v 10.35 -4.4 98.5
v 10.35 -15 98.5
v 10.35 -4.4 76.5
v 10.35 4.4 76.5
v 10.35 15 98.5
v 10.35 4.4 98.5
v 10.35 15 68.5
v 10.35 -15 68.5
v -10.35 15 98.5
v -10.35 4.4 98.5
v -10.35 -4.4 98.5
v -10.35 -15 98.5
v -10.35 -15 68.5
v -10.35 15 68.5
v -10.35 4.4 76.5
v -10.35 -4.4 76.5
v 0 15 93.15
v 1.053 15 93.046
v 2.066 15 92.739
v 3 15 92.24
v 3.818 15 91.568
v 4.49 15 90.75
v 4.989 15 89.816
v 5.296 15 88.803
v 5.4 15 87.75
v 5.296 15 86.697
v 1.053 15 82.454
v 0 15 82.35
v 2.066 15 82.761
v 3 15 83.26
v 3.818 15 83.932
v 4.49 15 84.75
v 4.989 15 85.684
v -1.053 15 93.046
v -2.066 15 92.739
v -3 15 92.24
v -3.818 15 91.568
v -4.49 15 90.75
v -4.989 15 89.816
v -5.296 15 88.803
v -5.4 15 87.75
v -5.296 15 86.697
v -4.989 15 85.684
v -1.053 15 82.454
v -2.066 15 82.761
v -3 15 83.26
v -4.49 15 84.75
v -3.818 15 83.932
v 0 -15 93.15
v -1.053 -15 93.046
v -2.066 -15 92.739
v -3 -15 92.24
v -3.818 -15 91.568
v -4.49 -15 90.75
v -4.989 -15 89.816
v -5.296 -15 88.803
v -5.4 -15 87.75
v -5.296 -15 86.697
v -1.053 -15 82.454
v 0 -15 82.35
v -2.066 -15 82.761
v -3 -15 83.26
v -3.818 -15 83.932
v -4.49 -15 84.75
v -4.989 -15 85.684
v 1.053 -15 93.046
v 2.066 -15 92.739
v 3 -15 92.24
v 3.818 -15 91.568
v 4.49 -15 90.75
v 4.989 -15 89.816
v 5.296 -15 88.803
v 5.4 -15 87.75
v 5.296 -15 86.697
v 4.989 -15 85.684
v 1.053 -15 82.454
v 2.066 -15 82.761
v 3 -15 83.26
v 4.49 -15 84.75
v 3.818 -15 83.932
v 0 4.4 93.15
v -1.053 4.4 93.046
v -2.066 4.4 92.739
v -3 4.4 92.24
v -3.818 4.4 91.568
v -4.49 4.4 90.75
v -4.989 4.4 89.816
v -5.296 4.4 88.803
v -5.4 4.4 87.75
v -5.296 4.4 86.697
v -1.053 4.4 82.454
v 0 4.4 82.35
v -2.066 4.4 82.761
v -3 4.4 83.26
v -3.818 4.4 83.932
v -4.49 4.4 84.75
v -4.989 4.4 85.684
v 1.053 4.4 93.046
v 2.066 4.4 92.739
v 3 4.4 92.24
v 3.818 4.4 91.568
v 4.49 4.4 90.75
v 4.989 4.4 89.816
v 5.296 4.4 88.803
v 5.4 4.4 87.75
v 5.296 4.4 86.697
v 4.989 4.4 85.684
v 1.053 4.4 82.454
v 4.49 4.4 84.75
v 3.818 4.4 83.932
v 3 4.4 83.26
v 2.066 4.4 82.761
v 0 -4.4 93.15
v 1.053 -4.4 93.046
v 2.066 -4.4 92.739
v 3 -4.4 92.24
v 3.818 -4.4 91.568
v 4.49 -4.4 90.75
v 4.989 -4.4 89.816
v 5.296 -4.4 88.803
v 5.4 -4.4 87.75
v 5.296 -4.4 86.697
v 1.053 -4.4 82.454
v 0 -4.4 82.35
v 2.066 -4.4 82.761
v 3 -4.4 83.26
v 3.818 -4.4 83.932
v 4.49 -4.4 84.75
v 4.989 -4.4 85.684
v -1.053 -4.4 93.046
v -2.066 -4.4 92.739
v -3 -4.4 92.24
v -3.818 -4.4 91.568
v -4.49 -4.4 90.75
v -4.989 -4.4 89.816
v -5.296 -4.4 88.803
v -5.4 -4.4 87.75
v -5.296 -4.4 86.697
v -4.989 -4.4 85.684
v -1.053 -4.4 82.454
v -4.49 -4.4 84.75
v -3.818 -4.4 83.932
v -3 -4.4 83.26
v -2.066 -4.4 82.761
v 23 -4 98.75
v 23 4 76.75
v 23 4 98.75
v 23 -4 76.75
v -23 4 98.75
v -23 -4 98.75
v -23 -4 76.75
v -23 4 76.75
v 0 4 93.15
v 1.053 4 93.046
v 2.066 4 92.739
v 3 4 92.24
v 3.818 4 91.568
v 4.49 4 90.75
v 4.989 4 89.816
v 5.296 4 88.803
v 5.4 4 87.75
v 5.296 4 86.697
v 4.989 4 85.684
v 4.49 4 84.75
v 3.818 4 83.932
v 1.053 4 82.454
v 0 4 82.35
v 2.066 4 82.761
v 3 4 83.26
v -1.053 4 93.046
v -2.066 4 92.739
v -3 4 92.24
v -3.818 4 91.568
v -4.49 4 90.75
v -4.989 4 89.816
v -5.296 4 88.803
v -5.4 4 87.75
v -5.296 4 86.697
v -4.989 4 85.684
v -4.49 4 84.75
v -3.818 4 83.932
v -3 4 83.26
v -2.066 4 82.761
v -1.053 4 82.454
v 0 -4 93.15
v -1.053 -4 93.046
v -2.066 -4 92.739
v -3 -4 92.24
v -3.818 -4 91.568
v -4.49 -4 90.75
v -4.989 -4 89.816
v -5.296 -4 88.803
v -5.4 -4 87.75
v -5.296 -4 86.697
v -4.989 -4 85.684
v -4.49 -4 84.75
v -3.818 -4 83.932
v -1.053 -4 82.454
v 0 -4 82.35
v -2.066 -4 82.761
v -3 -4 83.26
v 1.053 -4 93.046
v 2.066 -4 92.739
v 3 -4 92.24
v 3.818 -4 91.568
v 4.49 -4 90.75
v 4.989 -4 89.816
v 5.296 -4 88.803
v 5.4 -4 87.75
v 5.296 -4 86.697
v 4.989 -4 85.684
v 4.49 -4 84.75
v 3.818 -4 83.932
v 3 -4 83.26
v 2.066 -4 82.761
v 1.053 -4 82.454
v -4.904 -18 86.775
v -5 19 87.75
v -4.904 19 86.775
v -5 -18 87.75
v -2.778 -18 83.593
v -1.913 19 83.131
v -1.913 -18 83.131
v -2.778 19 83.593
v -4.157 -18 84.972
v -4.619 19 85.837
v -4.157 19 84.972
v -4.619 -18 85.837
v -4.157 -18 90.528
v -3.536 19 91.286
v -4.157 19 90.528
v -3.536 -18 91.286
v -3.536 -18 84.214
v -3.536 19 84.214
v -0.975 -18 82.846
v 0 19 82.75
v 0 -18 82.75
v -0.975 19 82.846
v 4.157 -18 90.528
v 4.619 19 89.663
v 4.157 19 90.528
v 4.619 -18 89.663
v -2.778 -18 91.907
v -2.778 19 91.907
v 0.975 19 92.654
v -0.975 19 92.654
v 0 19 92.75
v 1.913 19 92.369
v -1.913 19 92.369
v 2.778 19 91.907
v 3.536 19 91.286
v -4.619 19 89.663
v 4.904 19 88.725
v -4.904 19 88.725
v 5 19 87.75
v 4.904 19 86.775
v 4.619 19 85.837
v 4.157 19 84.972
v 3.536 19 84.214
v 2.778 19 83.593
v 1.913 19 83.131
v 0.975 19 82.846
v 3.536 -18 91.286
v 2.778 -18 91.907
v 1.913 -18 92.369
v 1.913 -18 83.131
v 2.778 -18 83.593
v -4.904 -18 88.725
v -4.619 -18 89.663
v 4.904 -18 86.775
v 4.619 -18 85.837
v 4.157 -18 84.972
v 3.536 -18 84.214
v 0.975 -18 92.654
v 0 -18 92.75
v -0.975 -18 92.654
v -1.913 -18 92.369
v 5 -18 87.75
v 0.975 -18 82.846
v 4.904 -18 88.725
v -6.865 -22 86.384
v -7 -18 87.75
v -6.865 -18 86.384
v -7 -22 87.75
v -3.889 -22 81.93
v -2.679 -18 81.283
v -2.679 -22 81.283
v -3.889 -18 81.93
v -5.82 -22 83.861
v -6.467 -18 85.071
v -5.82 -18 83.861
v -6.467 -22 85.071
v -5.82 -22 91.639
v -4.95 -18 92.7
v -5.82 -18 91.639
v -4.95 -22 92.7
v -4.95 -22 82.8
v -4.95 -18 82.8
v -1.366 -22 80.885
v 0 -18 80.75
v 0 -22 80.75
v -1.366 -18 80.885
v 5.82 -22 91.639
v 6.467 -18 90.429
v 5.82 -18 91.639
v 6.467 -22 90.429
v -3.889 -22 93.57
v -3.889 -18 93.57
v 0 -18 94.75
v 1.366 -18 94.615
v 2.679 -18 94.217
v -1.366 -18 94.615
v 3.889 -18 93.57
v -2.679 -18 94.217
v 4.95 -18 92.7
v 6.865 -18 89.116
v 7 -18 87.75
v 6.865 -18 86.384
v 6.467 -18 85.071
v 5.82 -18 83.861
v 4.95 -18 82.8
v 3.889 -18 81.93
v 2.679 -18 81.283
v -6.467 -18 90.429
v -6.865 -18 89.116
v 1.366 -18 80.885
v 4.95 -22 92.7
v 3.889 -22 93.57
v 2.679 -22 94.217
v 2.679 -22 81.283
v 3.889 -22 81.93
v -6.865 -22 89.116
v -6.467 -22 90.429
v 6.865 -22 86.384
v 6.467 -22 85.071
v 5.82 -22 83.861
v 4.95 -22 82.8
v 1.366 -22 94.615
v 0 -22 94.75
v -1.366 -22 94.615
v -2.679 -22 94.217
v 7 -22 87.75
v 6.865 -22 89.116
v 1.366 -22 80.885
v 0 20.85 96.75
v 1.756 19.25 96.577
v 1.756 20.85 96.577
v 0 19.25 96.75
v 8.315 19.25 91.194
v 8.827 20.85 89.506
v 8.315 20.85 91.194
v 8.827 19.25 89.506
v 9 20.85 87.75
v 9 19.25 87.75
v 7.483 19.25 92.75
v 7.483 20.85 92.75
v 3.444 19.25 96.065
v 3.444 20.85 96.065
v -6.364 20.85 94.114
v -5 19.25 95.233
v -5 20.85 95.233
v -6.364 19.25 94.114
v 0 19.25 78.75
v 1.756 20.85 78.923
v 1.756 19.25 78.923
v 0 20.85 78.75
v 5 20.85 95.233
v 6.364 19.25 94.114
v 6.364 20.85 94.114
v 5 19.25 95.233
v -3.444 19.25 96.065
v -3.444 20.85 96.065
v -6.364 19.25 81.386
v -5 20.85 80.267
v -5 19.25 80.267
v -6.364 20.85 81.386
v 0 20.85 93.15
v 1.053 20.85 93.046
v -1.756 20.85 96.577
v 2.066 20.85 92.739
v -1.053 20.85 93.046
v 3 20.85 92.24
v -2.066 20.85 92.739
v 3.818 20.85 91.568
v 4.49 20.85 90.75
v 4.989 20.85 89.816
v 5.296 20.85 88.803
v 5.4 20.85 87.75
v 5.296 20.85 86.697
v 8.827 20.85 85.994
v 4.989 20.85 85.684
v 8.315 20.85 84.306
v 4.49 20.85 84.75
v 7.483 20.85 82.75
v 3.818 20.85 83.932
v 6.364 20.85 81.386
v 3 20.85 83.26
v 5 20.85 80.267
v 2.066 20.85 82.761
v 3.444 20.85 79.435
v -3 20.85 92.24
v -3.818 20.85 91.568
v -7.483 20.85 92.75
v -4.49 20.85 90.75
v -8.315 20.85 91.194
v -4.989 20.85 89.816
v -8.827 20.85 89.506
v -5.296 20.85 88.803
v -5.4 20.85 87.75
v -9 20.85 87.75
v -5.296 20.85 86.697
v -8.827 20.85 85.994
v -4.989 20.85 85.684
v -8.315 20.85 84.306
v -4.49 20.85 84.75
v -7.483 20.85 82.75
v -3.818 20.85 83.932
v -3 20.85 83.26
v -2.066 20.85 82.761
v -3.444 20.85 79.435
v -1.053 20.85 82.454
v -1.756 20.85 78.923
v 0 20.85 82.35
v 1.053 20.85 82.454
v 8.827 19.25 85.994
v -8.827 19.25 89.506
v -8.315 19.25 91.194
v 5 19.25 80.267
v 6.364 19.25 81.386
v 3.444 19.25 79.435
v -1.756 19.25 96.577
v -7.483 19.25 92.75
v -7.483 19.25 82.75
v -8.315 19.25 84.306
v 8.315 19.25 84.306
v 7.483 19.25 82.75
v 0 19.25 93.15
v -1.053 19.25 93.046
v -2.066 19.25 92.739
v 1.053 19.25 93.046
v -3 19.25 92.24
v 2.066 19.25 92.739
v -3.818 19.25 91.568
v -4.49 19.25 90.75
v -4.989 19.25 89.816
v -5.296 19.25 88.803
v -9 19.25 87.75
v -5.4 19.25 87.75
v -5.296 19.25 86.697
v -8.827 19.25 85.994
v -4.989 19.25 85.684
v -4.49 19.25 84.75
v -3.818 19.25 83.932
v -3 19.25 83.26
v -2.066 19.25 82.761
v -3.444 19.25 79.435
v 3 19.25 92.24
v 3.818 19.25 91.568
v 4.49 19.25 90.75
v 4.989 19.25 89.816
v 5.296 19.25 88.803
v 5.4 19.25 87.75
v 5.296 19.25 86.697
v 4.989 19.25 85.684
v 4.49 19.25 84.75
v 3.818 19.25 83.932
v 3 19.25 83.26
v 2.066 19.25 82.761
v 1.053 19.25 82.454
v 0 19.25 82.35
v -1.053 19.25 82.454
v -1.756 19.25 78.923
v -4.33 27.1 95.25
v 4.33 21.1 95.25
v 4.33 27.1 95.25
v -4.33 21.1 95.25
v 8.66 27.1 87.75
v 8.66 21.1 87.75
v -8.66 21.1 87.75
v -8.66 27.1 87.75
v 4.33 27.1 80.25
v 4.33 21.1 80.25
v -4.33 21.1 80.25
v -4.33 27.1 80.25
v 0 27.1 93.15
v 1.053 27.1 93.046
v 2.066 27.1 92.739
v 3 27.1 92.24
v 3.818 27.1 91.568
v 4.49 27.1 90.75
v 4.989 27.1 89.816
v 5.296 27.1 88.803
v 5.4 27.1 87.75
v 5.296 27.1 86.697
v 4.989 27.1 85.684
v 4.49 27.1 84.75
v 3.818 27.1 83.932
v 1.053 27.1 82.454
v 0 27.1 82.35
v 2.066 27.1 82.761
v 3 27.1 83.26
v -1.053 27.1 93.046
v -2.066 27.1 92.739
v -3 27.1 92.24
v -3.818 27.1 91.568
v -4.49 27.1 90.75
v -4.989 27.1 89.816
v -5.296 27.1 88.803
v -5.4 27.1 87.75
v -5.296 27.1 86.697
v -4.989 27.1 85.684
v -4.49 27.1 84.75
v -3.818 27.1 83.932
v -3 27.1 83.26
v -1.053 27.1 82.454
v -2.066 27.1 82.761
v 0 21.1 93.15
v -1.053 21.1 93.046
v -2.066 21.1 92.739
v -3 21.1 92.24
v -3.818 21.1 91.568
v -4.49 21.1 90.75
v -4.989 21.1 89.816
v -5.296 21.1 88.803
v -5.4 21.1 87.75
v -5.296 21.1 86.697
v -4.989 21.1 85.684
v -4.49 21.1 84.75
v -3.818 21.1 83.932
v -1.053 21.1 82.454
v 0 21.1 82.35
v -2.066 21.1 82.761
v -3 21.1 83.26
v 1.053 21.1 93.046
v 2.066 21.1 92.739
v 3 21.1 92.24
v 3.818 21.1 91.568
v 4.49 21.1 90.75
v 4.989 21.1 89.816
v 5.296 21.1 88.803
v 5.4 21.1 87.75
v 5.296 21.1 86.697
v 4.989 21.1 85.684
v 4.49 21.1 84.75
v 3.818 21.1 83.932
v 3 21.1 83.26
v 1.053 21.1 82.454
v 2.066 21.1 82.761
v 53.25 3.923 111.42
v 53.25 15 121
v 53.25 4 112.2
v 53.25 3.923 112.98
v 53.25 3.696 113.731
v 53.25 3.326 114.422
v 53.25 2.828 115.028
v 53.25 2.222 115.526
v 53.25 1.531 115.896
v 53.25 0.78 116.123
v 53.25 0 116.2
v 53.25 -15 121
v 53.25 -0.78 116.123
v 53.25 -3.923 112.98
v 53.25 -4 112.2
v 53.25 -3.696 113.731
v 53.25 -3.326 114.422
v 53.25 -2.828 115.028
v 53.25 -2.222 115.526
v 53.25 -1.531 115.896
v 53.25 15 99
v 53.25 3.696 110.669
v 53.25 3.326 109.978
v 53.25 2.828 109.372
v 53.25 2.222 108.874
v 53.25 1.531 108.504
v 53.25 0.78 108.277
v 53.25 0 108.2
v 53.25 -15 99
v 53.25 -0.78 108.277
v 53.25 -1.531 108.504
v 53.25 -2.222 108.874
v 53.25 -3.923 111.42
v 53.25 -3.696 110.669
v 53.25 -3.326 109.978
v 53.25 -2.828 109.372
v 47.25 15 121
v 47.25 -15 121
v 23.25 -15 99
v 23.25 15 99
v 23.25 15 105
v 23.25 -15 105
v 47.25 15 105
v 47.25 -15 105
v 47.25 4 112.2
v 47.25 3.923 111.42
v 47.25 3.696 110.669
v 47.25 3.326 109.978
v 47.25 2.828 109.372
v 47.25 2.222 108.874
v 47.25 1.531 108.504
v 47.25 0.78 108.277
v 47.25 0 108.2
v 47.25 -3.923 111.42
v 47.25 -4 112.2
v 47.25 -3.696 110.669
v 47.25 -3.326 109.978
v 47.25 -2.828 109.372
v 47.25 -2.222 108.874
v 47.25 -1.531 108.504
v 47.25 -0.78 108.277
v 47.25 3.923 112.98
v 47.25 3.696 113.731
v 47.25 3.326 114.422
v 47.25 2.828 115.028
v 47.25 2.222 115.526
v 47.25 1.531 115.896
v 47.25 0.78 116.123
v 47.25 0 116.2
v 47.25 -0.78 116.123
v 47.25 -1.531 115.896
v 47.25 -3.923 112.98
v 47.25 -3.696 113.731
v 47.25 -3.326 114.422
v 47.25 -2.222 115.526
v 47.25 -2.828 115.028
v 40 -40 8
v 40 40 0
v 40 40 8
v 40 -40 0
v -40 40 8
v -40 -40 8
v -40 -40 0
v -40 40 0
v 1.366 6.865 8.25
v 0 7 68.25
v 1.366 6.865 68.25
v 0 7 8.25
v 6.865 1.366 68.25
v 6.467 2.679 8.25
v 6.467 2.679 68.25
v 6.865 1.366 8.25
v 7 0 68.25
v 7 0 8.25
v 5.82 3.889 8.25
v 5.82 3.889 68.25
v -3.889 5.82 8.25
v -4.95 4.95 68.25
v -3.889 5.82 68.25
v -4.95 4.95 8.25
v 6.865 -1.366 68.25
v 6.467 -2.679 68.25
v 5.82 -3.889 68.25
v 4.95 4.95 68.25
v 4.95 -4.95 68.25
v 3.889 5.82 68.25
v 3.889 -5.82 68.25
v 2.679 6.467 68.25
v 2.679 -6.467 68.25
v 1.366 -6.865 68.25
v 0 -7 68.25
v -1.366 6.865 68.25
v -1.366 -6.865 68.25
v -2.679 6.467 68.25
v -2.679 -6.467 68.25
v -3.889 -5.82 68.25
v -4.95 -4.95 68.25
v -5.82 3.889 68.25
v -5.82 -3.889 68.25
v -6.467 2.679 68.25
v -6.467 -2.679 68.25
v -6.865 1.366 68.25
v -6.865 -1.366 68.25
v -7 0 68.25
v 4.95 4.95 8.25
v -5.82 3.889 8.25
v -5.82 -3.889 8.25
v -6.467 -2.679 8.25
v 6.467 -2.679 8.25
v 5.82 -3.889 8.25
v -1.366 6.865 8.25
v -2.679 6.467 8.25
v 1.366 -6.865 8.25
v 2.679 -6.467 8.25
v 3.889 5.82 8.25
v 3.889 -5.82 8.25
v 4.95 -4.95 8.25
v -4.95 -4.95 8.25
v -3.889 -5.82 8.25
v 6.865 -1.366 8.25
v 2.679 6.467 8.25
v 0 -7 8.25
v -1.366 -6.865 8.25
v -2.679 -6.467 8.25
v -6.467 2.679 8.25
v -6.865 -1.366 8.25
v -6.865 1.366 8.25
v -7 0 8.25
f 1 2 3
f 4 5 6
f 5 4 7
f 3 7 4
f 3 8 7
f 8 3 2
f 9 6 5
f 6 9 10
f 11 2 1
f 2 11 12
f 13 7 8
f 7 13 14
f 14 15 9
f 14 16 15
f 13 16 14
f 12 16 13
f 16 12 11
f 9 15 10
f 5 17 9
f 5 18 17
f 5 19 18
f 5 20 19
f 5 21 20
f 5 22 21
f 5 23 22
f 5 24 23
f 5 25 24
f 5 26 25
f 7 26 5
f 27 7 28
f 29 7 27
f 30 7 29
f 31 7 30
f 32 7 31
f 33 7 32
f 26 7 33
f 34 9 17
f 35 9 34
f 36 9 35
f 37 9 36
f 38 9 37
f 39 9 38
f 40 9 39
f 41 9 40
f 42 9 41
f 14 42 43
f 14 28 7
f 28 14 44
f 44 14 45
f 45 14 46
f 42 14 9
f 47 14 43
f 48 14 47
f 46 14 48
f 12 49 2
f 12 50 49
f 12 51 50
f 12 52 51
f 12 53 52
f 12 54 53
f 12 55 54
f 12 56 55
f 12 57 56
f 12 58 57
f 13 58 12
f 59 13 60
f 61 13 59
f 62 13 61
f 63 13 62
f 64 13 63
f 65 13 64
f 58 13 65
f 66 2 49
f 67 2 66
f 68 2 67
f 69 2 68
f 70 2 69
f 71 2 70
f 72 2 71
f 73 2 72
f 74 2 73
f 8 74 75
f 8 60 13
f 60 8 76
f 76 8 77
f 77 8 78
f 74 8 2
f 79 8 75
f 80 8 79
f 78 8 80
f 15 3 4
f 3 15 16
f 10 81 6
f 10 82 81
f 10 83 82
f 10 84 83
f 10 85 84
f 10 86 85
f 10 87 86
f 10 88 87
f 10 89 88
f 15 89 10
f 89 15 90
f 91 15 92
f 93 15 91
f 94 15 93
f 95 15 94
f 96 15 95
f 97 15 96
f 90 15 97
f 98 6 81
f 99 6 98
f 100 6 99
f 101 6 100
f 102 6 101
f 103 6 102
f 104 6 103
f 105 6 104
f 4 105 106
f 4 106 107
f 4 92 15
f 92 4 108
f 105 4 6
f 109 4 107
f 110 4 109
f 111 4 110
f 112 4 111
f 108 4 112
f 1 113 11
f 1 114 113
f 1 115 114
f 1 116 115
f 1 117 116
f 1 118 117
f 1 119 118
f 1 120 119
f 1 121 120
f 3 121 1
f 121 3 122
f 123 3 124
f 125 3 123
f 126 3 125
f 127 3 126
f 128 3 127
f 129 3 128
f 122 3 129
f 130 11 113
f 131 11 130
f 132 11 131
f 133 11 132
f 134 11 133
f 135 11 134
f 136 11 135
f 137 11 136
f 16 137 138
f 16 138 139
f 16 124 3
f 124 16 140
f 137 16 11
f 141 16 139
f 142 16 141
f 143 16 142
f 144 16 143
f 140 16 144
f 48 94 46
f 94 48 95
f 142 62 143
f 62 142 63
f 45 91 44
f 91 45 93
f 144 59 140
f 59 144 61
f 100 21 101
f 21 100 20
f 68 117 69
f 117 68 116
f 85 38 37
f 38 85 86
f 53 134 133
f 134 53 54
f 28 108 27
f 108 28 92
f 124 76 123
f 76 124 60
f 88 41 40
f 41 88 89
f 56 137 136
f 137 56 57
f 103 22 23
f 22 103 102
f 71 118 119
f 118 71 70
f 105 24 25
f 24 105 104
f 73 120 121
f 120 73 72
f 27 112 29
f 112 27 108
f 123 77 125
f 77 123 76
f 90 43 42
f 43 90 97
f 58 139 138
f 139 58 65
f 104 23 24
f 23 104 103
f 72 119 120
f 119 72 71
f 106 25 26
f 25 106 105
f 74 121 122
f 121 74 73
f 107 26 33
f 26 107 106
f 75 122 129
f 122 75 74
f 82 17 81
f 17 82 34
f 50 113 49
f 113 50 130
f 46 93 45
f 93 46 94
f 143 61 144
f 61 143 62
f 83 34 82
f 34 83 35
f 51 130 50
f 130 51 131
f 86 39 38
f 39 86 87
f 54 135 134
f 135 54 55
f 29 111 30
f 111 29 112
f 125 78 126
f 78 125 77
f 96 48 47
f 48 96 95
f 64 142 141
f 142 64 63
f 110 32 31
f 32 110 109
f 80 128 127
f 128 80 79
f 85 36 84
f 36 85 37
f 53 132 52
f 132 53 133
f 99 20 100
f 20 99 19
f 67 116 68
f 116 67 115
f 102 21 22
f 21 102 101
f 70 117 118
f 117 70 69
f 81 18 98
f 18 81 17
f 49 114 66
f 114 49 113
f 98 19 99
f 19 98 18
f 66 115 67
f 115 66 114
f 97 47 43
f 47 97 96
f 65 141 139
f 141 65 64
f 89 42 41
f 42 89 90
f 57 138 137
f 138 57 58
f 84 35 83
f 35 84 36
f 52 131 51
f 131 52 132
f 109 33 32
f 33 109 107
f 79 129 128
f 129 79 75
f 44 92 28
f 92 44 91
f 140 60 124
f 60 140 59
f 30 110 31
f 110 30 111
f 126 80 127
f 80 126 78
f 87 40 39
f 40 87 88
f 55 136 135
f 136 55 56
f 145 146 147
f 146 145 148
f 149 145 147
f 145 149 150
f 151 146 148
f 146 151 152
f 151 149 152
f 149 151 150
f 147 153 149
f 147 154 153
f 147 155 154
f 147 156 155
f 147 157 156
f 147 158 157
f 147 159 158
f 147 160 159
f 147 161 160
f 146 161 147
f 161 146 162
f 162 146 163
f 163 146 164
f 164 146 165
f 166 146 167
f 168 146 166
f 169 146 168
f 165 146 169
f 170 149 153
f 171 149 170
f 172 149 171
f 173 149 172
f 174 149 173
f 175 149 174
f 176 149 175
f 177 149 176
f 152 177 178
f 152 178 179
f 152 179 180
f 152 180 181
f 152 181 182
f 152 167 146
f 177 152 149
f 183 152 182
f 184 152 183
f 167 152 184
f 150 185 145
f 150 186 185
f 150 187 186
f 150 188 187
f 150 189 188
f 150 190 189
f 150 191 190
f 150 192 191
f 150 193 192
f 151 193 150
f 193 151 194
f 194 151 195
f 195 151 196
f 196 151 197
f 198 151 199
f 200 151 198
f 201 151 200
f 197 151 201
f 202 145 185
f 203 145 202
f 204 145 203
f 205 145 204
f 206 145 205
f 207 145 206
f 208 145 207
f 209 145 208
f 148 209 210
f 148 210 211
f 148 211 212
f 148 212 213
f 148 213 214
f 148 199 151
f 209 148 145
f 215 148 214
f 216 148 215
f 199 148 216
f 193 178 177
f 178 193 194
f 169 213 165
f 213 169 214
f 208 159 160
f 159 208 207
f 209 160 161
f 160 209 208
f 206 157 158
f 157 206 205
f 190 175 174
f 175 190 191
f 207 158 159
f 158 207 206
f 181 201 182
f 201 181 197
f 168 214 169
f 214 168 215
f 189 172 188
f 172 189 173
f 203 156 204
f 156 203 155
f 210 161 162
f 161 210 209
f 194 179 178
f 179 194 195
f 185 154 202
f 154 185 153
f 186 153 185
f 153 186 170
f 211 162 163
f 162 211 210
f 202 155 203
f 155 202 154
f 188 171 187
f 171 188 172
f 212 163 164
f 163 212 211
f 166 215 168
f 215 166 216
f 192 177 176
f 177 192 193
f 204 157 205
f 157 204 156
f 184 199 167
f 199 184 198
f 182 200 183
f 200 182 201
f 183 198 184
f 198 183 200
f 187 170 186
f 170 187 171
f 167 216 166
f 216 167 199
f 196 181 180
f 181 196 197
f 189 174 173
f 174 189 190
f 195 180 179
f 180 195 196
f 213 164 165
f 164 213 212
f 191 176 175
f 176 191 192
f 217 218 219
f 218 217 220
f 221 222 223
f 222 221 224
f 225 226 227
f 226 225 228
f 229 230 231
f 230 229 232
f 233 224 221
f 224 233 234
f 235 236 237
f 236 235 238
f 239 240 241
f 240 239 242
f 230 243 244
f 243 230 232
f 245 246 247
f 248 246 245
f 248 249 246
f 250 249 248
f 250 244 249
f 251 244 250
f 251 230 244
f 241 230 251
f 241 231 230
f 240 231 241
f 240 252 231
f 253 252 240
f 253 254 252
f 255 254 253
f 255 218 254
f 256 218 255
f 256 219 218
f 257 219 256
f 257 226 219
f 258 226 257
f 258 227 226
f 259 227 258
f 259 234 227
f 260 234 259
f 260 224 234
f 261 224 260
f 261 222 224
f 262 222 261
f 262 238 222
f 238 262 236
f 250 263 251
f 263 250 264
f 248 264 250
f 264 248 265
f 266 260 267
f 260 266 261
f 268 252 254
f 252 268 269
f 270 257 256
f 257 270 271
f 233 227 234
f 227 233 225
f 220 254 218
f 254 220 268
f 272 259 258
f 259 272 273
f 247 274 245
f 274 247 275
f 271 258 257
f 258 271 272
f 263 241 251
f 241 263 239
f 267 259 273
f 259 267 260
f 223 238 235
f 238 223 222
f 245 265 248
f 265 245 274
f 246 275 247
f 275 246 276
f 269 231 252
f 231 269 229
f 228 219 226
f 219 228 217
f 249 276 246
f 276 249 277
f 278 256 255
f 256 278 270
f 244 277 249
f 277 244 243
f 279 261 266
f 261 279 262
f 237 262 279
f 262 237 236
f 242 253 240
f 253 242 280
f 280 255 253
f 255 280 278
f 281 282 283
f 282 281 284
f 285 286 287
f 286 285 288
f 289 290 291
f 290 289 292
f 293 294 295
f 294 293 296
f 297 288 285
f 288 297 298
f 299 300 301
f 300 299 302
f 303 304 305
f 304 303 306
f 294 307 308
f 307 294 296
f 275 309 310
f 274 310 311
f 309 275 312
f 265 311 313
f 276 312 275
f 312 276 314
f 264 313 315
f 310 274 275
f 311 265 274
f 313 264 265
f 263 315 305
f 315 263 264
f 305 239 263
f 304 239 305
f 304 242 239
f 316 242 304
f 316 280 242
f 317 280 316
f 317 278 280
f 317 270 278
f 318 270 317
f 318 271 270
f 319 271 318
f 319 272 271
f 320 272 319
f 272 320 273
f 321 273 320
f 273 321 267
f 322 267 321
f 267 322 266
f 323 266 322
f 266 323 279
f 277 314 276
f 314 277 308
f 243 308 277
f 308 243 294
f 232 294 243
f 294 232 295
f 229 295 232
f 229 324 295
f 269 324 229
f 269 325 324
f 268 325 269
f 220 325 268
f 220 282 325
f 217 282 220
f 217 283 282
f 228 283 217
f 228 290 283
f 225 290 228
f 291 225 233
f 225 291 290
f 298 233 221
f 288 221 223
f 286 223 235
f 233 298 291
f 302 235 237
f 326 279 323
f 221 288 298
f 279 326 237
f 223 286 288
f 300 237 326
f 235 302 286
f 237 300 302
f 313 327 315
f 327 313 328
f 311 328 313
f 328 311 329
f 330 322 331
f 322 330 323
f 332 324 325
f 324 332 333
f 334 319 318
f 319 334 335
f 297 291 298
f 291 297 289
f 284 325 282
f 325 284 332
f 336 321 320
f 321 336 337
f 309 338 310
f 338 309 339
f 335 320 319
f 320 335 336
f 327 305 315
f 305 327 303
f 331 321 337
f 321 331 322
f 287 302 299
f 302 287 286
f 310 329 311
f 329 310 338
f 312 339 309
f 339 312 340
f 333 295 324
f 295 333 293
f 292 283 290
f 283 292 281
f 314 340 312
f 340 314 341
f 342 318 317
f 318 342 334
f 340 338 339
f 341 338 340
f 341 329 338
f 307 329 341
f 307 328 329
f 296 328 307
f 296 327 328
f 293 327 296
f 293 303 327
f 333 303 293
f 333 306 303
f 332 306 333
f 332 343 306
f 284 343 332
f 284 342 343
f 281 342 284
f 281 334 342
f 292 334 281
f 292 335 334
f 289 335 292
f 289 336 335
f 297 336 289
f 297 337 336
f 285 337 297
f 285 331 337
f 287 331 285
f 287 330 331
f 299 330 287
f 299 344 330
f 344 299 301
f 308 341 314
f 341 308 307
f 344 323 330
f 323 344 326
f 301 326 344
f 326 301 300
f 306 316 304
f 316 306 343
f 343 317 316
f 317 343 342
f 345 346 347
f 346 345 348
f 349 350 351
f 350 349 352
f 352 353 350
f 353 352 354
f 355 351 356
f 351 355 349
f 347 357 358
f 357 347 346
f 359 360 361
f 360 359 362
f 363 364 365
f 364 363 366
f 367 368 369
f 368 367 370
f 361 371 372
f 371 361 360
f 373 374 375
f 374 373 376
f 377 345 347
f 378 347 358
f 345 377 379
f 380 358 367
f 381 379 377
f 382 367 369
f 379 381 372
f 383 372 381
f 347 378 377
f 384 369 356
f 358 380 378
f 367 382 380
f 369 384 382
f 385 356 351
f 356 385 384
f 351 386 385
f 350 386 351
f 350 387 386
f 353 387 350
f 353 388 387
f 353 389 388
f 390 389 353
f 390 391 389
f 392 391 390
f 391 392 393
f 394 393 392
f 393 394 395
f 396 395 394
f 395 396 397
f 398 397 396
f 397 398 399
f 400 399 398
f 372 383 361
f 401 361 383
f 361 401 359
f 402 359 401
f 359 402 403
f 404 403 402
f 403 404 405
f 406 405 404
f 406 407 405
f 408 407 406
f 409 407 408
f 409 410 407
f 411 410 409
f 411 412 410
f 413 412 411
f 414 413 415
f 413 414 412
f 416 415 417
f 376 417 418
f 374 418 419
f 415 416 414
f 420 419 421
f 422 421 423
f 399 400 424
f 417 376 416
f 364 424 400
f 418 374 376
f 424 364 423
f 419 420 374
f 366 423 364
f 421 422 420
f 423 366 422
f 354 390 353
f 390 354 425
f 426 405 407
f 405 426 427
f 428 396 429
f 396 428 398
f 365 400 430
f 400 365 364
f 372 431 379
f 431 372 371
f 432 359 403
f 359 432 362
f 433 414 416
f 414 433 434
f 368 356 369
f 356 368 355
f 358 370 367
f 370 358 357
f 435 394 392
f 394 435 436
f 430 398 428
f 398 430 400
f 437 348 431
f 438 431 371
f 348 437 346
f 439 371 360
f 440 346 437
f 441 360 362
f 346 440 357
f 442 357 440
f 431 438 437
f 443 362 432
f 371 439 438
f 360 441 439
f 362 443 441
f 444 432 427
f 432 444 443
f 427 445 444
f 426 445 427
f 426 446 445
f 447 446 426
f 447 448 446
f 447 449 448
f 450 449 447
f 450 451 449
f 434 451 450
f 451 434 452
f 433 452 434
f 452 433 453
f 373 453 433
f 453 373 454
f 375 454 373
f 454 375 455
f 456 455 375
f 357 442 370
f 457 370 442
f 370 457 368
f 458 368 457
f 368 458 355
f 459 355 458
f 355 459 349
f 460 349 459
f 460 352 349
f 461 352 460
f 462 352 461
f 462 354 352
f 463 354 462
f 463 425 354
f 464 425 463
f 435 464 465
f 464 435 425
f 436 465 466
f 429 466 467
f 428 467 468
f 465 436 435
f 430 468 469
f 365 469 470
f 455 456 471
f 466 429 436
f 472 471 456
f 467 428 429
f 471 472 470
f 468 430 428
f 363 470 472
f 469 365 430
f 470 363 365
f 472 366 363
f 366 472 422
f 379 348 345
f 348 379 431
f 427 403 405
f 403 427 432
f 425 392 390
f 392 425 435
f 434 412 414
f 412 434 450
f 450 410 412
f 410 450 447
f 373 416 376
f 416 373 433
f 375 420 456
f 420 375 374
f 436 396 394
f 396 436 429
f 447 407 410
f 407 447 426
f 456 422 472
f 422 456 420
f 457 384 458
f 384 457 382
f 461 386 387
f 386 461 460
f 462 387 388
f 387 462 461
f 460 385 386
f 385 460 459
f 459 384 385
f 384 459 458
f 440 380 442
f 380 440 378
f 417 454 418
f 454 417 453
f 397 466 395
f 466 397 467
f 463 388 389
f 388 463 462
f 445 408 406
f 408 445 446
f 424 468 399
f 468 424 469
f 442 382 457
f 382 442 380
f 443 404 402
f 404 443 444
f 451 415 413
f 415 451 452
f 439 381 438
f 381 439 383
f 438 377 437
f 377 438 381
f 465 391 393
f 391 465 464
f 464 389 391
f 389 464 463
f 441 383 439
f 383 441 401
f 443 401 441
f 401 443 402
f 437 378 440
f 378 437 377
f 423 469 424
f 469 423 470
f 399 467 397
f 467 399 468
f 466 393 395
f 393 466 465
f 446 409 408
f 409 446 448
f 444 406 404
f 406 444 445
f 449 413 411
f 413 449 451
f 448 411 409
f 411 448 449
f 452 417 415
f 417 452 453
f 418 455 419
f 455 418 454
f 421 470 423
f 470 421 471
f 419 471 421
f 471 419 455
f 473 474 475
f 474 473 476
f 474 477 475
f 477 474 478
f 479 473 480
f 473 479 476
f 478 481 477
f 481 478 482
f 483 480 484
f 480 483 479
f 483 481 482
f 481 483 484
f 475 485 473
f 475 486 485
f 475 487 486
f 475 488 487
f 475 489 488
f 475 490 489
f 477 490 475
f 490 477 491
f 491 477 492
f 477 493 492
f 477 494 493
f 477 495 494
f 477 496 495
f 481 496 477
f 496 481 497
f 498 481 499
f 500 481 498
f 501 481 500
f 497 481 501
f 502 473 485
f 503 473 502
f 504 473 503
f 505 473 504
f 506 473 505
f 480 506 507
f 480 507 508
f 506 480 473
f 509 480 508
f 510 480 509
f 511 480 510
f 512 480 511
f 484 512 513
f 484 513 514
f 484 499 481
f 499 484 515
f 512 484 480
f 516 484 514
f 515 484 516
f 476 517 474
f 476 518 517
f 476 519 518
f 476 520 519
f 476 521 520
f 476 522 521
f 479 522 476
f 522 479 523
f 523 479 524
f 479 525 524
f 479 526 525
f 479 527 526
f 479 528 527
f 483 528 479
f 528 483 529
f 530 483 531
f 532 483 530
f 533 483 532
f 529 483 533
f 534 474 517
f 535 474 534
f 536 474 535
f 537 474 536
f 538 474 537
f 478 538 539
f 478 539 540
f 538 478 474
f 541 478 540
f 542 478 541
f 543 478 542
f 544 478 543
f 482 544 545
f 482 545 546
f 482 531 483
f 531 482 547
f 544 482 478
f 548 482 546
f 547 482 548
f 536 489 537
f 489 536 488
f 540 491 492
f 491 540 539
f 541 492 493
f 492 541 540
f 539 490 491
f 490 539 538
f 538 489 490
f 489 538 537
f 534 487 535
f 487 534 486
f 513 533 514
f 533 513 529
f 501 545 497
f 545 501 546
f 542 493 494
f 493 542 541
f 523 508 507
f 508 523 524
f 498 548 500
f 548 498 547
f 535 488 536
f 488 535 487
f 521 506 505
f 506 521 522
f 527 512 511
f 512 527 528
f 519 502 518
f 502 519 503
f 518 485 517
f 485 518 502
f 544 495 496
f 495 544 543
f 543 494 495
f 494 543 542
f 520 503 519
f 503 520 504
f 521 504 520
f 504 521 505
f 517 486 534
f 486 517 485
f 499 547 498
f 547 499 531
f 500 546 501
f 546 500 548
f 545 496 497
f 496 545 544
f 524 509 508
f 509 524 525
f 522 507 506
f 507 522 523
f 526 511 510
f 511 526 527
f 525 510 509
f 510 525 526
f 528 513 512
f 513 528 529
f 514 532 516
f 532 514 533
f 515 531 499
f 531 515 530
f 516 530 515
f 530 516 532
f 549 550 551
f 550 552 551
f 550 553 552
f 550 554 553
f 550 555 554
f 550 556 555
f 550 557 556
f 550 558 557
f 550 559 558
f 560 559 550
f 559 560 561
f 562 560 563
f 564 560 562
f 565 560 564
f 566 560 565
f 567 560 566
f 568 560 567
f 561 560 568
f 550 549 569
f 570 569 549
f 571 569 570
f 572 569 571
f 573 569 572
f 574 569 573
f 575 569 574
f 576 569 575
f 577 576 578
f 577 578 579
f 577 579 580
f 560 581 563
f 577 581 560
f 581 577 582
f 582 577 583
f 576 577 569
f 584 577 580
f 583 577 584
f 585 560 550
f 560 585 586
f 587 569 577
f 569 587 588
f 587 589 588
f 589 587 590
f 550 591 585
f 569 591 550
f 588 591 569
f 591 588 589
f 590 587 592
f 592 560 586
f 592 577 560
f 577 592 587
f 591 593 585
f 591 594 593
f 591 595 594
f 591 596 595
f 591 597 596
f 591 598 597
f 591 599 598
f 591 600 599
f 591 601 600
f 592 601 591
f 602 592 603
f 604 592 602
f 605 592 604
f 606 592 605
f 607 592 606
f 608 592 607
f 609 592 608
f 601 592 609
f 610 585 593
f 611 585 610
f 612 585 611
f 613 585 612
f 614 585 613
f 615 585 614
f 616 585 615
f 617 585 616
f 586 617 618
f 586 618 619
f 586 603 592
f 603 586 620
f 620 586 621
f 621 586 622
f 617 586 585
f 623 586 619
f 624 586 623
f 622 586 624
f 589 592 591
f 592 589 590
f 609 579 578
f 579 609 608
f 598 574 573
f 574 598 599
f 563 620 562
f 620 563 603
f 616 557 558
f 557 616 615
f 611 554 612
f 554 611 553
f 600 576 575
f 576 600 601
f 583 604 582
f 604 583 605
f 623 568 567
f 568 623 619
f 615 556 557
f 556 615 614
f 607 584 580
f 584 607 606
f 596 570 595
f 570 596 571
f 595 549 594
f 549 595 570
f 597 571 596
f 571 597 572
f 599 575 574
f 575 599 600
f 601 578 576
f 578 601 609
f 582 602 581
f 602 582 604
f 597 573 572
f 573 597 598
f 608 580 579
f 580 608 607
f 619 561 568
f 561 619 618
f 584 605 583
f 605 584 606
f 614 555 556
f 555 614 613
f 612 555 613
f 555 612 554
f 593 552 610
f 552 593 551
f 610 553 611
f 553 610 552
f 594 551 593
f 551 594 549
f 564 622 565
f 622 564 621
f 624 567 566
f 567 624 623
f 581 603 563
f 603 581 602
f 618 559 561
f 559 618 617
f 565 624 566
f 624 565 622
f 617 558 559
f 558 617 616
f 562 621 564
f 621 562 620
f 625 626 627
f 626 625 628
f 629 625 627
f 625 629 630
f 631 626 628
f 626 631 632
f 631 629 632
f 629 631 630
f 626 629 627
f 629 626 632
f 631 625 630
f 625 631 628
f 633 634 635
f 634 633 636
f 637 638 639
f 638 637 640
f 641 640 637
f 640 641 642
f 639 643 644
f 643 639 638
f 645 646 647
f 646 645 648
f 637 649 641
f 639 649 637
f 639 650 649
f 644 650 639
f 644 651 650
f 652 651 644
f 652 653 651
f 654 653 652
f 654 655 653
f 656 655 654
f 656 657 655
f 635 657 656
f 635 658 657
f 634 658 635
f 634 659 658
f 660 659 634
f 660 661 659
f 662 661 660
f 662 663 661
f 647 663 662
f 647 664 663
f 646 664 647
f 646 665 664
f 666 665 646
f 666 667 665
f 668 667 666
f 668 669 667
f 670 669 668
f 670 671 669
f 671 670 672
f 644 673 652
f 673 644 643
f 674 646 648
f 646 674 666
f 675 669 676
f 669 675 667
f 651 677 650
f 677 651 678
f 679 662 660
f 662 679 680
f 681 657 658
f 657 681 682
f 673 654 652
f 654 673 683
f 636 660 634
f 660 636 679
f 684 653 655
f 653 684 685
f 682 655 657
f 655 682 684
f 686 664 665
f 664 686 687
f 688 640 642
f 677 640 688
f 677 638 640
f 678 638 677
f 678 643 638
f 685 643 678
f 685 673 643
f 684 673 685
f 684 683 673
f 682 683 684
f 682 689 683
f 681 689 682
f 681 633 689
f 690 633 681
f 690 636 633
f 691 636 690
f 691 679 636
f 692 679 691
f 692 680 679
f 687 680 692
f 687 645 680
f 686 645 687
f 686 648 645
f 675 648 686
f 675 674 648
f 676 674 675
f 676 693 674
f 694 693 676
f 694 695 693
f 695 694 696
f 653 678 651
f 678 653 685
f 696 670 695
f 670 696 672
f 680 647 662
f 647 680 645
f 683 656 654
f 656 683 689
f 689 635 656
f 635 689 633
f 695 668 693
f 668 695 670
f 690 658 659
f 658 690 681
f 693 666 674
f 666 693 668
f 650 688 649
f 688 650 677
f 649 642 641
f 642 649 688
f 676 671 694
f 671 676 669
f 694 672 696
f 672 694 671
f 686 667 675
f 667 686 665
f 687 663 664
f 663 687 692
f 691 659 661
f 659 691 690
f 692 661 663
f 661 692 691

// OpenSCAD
$fn = 32;

// ------------------------------------------------------------------------
// Lamp arm: column d14 x 60 mm, arm 46 mm
// Every part is its own module, assembly() places every instance.
// ------------------------------------------------------------------------

// --- part 1 ---
module lamp_base() {
  difference() {
    translate([-40, -40, 0]) cube([80, 80, 8]);
  }
}

// --- part 2 ---
module lamp_column() {
  cylinder(h = 60, d = 14);
}

// --- part 3 ---
module head_fork() {
  difference() {
    translate([-10.35, -15, 0]) cube([20.7, 30, 30]);
    translate([-11.35, -4.4, 8]) cube([22.7, 8.8, 23]);
    translate([0, 0, 19.25]) rotate([90, 0, 0]) cylinder(h = 32, d = 10.8, center = true);
  }
}

// --- part 4 ---
module lamp_arm() {
  difference() {
    translate([-23, -4, 0]) cube([46, 8, 22]);
    translate([0, 0, 11]) rotate([90, 0, 0]) cylinder(h = 10, d = 10.8, center = true);
  }
}

// --- part 5 ---
module arm_pin() {
  rotate([0, 90, 0]) cylinder(h = 38, d = 10, center = true);
  translate([-22, 0, 0]) rotate([0, 90, 0]) cylinder(h = 4, d = 14);
}

// --- part 6 ---
module arm_washer() {
  difference() {
      translate([0, 0, 0]) cylinder(h = 1.6, d = 18);
      translate([0, 0, -1]) cylinder(h = 3.6, d = 10.8);
    }
}

// --- part 7 ---
module arm_nut() {
  difference() {
    linear_extrude(height = 6) polygon(points = [[8.66, 0], [4.33, 7.5], [-4.33, 7.5], [-8.66, 0], [-4.33, -7.5], [4.33, -7.5]]);
    translate([0, 0, -1]) cylinder(h = 8, d = 10.8);
  }
}

// --- part 8 ---
module shade_bracket() {
  difference() {
    translate([-15, -15, 0]) cube([30, 30, 22]);
    translate([-16, -16, 6]) cube([25, 32, 17]);
    translate([12, 0, 13.2]) rotate([0, 90, 0]) cylinder(h = 8, d = 8, center = true);
  }
}

// --- assembly ---
module assembly() {
  color([0.80, 0.24, 0.20]) translate([0, 0, 0]) rotate([0, 0, 0]) lamp_base();
  color([0.20, 0.45, 0.75]) translate([0, 0, 8.25]) rotate([0, 0, 0]) lamp_column();
  color([0.25, 0.62, 0.32]) translate([0, 0, 68.5]) rotate([0, 0, 0]) head_fork();
  color([0.92, 0.70, 0.18]) translate([0, 0, 76.75]) rotate([0, 0, 0]) lamp_arm();
  color([0.58, 0.35, 0.70]) translate([0, 0, 87.75]) rotate([0, 0, 90]) arm_pin();
  color([0.16, 0.66, 0.66]) translate([0, 20.85, 87.75]) rotate([90, 0, 0]) arm_washer();
  color([0.85, 0.48, 0.18]) translate([0, 27.1, 87.75]) rotate([90, 0, 0]) arm_nut();
  color([0.55, 0.60, 0.65]) translate([38.25, 0, 99]) rotate([0, 0, 0]) shade_bracket();
}

assembly();
